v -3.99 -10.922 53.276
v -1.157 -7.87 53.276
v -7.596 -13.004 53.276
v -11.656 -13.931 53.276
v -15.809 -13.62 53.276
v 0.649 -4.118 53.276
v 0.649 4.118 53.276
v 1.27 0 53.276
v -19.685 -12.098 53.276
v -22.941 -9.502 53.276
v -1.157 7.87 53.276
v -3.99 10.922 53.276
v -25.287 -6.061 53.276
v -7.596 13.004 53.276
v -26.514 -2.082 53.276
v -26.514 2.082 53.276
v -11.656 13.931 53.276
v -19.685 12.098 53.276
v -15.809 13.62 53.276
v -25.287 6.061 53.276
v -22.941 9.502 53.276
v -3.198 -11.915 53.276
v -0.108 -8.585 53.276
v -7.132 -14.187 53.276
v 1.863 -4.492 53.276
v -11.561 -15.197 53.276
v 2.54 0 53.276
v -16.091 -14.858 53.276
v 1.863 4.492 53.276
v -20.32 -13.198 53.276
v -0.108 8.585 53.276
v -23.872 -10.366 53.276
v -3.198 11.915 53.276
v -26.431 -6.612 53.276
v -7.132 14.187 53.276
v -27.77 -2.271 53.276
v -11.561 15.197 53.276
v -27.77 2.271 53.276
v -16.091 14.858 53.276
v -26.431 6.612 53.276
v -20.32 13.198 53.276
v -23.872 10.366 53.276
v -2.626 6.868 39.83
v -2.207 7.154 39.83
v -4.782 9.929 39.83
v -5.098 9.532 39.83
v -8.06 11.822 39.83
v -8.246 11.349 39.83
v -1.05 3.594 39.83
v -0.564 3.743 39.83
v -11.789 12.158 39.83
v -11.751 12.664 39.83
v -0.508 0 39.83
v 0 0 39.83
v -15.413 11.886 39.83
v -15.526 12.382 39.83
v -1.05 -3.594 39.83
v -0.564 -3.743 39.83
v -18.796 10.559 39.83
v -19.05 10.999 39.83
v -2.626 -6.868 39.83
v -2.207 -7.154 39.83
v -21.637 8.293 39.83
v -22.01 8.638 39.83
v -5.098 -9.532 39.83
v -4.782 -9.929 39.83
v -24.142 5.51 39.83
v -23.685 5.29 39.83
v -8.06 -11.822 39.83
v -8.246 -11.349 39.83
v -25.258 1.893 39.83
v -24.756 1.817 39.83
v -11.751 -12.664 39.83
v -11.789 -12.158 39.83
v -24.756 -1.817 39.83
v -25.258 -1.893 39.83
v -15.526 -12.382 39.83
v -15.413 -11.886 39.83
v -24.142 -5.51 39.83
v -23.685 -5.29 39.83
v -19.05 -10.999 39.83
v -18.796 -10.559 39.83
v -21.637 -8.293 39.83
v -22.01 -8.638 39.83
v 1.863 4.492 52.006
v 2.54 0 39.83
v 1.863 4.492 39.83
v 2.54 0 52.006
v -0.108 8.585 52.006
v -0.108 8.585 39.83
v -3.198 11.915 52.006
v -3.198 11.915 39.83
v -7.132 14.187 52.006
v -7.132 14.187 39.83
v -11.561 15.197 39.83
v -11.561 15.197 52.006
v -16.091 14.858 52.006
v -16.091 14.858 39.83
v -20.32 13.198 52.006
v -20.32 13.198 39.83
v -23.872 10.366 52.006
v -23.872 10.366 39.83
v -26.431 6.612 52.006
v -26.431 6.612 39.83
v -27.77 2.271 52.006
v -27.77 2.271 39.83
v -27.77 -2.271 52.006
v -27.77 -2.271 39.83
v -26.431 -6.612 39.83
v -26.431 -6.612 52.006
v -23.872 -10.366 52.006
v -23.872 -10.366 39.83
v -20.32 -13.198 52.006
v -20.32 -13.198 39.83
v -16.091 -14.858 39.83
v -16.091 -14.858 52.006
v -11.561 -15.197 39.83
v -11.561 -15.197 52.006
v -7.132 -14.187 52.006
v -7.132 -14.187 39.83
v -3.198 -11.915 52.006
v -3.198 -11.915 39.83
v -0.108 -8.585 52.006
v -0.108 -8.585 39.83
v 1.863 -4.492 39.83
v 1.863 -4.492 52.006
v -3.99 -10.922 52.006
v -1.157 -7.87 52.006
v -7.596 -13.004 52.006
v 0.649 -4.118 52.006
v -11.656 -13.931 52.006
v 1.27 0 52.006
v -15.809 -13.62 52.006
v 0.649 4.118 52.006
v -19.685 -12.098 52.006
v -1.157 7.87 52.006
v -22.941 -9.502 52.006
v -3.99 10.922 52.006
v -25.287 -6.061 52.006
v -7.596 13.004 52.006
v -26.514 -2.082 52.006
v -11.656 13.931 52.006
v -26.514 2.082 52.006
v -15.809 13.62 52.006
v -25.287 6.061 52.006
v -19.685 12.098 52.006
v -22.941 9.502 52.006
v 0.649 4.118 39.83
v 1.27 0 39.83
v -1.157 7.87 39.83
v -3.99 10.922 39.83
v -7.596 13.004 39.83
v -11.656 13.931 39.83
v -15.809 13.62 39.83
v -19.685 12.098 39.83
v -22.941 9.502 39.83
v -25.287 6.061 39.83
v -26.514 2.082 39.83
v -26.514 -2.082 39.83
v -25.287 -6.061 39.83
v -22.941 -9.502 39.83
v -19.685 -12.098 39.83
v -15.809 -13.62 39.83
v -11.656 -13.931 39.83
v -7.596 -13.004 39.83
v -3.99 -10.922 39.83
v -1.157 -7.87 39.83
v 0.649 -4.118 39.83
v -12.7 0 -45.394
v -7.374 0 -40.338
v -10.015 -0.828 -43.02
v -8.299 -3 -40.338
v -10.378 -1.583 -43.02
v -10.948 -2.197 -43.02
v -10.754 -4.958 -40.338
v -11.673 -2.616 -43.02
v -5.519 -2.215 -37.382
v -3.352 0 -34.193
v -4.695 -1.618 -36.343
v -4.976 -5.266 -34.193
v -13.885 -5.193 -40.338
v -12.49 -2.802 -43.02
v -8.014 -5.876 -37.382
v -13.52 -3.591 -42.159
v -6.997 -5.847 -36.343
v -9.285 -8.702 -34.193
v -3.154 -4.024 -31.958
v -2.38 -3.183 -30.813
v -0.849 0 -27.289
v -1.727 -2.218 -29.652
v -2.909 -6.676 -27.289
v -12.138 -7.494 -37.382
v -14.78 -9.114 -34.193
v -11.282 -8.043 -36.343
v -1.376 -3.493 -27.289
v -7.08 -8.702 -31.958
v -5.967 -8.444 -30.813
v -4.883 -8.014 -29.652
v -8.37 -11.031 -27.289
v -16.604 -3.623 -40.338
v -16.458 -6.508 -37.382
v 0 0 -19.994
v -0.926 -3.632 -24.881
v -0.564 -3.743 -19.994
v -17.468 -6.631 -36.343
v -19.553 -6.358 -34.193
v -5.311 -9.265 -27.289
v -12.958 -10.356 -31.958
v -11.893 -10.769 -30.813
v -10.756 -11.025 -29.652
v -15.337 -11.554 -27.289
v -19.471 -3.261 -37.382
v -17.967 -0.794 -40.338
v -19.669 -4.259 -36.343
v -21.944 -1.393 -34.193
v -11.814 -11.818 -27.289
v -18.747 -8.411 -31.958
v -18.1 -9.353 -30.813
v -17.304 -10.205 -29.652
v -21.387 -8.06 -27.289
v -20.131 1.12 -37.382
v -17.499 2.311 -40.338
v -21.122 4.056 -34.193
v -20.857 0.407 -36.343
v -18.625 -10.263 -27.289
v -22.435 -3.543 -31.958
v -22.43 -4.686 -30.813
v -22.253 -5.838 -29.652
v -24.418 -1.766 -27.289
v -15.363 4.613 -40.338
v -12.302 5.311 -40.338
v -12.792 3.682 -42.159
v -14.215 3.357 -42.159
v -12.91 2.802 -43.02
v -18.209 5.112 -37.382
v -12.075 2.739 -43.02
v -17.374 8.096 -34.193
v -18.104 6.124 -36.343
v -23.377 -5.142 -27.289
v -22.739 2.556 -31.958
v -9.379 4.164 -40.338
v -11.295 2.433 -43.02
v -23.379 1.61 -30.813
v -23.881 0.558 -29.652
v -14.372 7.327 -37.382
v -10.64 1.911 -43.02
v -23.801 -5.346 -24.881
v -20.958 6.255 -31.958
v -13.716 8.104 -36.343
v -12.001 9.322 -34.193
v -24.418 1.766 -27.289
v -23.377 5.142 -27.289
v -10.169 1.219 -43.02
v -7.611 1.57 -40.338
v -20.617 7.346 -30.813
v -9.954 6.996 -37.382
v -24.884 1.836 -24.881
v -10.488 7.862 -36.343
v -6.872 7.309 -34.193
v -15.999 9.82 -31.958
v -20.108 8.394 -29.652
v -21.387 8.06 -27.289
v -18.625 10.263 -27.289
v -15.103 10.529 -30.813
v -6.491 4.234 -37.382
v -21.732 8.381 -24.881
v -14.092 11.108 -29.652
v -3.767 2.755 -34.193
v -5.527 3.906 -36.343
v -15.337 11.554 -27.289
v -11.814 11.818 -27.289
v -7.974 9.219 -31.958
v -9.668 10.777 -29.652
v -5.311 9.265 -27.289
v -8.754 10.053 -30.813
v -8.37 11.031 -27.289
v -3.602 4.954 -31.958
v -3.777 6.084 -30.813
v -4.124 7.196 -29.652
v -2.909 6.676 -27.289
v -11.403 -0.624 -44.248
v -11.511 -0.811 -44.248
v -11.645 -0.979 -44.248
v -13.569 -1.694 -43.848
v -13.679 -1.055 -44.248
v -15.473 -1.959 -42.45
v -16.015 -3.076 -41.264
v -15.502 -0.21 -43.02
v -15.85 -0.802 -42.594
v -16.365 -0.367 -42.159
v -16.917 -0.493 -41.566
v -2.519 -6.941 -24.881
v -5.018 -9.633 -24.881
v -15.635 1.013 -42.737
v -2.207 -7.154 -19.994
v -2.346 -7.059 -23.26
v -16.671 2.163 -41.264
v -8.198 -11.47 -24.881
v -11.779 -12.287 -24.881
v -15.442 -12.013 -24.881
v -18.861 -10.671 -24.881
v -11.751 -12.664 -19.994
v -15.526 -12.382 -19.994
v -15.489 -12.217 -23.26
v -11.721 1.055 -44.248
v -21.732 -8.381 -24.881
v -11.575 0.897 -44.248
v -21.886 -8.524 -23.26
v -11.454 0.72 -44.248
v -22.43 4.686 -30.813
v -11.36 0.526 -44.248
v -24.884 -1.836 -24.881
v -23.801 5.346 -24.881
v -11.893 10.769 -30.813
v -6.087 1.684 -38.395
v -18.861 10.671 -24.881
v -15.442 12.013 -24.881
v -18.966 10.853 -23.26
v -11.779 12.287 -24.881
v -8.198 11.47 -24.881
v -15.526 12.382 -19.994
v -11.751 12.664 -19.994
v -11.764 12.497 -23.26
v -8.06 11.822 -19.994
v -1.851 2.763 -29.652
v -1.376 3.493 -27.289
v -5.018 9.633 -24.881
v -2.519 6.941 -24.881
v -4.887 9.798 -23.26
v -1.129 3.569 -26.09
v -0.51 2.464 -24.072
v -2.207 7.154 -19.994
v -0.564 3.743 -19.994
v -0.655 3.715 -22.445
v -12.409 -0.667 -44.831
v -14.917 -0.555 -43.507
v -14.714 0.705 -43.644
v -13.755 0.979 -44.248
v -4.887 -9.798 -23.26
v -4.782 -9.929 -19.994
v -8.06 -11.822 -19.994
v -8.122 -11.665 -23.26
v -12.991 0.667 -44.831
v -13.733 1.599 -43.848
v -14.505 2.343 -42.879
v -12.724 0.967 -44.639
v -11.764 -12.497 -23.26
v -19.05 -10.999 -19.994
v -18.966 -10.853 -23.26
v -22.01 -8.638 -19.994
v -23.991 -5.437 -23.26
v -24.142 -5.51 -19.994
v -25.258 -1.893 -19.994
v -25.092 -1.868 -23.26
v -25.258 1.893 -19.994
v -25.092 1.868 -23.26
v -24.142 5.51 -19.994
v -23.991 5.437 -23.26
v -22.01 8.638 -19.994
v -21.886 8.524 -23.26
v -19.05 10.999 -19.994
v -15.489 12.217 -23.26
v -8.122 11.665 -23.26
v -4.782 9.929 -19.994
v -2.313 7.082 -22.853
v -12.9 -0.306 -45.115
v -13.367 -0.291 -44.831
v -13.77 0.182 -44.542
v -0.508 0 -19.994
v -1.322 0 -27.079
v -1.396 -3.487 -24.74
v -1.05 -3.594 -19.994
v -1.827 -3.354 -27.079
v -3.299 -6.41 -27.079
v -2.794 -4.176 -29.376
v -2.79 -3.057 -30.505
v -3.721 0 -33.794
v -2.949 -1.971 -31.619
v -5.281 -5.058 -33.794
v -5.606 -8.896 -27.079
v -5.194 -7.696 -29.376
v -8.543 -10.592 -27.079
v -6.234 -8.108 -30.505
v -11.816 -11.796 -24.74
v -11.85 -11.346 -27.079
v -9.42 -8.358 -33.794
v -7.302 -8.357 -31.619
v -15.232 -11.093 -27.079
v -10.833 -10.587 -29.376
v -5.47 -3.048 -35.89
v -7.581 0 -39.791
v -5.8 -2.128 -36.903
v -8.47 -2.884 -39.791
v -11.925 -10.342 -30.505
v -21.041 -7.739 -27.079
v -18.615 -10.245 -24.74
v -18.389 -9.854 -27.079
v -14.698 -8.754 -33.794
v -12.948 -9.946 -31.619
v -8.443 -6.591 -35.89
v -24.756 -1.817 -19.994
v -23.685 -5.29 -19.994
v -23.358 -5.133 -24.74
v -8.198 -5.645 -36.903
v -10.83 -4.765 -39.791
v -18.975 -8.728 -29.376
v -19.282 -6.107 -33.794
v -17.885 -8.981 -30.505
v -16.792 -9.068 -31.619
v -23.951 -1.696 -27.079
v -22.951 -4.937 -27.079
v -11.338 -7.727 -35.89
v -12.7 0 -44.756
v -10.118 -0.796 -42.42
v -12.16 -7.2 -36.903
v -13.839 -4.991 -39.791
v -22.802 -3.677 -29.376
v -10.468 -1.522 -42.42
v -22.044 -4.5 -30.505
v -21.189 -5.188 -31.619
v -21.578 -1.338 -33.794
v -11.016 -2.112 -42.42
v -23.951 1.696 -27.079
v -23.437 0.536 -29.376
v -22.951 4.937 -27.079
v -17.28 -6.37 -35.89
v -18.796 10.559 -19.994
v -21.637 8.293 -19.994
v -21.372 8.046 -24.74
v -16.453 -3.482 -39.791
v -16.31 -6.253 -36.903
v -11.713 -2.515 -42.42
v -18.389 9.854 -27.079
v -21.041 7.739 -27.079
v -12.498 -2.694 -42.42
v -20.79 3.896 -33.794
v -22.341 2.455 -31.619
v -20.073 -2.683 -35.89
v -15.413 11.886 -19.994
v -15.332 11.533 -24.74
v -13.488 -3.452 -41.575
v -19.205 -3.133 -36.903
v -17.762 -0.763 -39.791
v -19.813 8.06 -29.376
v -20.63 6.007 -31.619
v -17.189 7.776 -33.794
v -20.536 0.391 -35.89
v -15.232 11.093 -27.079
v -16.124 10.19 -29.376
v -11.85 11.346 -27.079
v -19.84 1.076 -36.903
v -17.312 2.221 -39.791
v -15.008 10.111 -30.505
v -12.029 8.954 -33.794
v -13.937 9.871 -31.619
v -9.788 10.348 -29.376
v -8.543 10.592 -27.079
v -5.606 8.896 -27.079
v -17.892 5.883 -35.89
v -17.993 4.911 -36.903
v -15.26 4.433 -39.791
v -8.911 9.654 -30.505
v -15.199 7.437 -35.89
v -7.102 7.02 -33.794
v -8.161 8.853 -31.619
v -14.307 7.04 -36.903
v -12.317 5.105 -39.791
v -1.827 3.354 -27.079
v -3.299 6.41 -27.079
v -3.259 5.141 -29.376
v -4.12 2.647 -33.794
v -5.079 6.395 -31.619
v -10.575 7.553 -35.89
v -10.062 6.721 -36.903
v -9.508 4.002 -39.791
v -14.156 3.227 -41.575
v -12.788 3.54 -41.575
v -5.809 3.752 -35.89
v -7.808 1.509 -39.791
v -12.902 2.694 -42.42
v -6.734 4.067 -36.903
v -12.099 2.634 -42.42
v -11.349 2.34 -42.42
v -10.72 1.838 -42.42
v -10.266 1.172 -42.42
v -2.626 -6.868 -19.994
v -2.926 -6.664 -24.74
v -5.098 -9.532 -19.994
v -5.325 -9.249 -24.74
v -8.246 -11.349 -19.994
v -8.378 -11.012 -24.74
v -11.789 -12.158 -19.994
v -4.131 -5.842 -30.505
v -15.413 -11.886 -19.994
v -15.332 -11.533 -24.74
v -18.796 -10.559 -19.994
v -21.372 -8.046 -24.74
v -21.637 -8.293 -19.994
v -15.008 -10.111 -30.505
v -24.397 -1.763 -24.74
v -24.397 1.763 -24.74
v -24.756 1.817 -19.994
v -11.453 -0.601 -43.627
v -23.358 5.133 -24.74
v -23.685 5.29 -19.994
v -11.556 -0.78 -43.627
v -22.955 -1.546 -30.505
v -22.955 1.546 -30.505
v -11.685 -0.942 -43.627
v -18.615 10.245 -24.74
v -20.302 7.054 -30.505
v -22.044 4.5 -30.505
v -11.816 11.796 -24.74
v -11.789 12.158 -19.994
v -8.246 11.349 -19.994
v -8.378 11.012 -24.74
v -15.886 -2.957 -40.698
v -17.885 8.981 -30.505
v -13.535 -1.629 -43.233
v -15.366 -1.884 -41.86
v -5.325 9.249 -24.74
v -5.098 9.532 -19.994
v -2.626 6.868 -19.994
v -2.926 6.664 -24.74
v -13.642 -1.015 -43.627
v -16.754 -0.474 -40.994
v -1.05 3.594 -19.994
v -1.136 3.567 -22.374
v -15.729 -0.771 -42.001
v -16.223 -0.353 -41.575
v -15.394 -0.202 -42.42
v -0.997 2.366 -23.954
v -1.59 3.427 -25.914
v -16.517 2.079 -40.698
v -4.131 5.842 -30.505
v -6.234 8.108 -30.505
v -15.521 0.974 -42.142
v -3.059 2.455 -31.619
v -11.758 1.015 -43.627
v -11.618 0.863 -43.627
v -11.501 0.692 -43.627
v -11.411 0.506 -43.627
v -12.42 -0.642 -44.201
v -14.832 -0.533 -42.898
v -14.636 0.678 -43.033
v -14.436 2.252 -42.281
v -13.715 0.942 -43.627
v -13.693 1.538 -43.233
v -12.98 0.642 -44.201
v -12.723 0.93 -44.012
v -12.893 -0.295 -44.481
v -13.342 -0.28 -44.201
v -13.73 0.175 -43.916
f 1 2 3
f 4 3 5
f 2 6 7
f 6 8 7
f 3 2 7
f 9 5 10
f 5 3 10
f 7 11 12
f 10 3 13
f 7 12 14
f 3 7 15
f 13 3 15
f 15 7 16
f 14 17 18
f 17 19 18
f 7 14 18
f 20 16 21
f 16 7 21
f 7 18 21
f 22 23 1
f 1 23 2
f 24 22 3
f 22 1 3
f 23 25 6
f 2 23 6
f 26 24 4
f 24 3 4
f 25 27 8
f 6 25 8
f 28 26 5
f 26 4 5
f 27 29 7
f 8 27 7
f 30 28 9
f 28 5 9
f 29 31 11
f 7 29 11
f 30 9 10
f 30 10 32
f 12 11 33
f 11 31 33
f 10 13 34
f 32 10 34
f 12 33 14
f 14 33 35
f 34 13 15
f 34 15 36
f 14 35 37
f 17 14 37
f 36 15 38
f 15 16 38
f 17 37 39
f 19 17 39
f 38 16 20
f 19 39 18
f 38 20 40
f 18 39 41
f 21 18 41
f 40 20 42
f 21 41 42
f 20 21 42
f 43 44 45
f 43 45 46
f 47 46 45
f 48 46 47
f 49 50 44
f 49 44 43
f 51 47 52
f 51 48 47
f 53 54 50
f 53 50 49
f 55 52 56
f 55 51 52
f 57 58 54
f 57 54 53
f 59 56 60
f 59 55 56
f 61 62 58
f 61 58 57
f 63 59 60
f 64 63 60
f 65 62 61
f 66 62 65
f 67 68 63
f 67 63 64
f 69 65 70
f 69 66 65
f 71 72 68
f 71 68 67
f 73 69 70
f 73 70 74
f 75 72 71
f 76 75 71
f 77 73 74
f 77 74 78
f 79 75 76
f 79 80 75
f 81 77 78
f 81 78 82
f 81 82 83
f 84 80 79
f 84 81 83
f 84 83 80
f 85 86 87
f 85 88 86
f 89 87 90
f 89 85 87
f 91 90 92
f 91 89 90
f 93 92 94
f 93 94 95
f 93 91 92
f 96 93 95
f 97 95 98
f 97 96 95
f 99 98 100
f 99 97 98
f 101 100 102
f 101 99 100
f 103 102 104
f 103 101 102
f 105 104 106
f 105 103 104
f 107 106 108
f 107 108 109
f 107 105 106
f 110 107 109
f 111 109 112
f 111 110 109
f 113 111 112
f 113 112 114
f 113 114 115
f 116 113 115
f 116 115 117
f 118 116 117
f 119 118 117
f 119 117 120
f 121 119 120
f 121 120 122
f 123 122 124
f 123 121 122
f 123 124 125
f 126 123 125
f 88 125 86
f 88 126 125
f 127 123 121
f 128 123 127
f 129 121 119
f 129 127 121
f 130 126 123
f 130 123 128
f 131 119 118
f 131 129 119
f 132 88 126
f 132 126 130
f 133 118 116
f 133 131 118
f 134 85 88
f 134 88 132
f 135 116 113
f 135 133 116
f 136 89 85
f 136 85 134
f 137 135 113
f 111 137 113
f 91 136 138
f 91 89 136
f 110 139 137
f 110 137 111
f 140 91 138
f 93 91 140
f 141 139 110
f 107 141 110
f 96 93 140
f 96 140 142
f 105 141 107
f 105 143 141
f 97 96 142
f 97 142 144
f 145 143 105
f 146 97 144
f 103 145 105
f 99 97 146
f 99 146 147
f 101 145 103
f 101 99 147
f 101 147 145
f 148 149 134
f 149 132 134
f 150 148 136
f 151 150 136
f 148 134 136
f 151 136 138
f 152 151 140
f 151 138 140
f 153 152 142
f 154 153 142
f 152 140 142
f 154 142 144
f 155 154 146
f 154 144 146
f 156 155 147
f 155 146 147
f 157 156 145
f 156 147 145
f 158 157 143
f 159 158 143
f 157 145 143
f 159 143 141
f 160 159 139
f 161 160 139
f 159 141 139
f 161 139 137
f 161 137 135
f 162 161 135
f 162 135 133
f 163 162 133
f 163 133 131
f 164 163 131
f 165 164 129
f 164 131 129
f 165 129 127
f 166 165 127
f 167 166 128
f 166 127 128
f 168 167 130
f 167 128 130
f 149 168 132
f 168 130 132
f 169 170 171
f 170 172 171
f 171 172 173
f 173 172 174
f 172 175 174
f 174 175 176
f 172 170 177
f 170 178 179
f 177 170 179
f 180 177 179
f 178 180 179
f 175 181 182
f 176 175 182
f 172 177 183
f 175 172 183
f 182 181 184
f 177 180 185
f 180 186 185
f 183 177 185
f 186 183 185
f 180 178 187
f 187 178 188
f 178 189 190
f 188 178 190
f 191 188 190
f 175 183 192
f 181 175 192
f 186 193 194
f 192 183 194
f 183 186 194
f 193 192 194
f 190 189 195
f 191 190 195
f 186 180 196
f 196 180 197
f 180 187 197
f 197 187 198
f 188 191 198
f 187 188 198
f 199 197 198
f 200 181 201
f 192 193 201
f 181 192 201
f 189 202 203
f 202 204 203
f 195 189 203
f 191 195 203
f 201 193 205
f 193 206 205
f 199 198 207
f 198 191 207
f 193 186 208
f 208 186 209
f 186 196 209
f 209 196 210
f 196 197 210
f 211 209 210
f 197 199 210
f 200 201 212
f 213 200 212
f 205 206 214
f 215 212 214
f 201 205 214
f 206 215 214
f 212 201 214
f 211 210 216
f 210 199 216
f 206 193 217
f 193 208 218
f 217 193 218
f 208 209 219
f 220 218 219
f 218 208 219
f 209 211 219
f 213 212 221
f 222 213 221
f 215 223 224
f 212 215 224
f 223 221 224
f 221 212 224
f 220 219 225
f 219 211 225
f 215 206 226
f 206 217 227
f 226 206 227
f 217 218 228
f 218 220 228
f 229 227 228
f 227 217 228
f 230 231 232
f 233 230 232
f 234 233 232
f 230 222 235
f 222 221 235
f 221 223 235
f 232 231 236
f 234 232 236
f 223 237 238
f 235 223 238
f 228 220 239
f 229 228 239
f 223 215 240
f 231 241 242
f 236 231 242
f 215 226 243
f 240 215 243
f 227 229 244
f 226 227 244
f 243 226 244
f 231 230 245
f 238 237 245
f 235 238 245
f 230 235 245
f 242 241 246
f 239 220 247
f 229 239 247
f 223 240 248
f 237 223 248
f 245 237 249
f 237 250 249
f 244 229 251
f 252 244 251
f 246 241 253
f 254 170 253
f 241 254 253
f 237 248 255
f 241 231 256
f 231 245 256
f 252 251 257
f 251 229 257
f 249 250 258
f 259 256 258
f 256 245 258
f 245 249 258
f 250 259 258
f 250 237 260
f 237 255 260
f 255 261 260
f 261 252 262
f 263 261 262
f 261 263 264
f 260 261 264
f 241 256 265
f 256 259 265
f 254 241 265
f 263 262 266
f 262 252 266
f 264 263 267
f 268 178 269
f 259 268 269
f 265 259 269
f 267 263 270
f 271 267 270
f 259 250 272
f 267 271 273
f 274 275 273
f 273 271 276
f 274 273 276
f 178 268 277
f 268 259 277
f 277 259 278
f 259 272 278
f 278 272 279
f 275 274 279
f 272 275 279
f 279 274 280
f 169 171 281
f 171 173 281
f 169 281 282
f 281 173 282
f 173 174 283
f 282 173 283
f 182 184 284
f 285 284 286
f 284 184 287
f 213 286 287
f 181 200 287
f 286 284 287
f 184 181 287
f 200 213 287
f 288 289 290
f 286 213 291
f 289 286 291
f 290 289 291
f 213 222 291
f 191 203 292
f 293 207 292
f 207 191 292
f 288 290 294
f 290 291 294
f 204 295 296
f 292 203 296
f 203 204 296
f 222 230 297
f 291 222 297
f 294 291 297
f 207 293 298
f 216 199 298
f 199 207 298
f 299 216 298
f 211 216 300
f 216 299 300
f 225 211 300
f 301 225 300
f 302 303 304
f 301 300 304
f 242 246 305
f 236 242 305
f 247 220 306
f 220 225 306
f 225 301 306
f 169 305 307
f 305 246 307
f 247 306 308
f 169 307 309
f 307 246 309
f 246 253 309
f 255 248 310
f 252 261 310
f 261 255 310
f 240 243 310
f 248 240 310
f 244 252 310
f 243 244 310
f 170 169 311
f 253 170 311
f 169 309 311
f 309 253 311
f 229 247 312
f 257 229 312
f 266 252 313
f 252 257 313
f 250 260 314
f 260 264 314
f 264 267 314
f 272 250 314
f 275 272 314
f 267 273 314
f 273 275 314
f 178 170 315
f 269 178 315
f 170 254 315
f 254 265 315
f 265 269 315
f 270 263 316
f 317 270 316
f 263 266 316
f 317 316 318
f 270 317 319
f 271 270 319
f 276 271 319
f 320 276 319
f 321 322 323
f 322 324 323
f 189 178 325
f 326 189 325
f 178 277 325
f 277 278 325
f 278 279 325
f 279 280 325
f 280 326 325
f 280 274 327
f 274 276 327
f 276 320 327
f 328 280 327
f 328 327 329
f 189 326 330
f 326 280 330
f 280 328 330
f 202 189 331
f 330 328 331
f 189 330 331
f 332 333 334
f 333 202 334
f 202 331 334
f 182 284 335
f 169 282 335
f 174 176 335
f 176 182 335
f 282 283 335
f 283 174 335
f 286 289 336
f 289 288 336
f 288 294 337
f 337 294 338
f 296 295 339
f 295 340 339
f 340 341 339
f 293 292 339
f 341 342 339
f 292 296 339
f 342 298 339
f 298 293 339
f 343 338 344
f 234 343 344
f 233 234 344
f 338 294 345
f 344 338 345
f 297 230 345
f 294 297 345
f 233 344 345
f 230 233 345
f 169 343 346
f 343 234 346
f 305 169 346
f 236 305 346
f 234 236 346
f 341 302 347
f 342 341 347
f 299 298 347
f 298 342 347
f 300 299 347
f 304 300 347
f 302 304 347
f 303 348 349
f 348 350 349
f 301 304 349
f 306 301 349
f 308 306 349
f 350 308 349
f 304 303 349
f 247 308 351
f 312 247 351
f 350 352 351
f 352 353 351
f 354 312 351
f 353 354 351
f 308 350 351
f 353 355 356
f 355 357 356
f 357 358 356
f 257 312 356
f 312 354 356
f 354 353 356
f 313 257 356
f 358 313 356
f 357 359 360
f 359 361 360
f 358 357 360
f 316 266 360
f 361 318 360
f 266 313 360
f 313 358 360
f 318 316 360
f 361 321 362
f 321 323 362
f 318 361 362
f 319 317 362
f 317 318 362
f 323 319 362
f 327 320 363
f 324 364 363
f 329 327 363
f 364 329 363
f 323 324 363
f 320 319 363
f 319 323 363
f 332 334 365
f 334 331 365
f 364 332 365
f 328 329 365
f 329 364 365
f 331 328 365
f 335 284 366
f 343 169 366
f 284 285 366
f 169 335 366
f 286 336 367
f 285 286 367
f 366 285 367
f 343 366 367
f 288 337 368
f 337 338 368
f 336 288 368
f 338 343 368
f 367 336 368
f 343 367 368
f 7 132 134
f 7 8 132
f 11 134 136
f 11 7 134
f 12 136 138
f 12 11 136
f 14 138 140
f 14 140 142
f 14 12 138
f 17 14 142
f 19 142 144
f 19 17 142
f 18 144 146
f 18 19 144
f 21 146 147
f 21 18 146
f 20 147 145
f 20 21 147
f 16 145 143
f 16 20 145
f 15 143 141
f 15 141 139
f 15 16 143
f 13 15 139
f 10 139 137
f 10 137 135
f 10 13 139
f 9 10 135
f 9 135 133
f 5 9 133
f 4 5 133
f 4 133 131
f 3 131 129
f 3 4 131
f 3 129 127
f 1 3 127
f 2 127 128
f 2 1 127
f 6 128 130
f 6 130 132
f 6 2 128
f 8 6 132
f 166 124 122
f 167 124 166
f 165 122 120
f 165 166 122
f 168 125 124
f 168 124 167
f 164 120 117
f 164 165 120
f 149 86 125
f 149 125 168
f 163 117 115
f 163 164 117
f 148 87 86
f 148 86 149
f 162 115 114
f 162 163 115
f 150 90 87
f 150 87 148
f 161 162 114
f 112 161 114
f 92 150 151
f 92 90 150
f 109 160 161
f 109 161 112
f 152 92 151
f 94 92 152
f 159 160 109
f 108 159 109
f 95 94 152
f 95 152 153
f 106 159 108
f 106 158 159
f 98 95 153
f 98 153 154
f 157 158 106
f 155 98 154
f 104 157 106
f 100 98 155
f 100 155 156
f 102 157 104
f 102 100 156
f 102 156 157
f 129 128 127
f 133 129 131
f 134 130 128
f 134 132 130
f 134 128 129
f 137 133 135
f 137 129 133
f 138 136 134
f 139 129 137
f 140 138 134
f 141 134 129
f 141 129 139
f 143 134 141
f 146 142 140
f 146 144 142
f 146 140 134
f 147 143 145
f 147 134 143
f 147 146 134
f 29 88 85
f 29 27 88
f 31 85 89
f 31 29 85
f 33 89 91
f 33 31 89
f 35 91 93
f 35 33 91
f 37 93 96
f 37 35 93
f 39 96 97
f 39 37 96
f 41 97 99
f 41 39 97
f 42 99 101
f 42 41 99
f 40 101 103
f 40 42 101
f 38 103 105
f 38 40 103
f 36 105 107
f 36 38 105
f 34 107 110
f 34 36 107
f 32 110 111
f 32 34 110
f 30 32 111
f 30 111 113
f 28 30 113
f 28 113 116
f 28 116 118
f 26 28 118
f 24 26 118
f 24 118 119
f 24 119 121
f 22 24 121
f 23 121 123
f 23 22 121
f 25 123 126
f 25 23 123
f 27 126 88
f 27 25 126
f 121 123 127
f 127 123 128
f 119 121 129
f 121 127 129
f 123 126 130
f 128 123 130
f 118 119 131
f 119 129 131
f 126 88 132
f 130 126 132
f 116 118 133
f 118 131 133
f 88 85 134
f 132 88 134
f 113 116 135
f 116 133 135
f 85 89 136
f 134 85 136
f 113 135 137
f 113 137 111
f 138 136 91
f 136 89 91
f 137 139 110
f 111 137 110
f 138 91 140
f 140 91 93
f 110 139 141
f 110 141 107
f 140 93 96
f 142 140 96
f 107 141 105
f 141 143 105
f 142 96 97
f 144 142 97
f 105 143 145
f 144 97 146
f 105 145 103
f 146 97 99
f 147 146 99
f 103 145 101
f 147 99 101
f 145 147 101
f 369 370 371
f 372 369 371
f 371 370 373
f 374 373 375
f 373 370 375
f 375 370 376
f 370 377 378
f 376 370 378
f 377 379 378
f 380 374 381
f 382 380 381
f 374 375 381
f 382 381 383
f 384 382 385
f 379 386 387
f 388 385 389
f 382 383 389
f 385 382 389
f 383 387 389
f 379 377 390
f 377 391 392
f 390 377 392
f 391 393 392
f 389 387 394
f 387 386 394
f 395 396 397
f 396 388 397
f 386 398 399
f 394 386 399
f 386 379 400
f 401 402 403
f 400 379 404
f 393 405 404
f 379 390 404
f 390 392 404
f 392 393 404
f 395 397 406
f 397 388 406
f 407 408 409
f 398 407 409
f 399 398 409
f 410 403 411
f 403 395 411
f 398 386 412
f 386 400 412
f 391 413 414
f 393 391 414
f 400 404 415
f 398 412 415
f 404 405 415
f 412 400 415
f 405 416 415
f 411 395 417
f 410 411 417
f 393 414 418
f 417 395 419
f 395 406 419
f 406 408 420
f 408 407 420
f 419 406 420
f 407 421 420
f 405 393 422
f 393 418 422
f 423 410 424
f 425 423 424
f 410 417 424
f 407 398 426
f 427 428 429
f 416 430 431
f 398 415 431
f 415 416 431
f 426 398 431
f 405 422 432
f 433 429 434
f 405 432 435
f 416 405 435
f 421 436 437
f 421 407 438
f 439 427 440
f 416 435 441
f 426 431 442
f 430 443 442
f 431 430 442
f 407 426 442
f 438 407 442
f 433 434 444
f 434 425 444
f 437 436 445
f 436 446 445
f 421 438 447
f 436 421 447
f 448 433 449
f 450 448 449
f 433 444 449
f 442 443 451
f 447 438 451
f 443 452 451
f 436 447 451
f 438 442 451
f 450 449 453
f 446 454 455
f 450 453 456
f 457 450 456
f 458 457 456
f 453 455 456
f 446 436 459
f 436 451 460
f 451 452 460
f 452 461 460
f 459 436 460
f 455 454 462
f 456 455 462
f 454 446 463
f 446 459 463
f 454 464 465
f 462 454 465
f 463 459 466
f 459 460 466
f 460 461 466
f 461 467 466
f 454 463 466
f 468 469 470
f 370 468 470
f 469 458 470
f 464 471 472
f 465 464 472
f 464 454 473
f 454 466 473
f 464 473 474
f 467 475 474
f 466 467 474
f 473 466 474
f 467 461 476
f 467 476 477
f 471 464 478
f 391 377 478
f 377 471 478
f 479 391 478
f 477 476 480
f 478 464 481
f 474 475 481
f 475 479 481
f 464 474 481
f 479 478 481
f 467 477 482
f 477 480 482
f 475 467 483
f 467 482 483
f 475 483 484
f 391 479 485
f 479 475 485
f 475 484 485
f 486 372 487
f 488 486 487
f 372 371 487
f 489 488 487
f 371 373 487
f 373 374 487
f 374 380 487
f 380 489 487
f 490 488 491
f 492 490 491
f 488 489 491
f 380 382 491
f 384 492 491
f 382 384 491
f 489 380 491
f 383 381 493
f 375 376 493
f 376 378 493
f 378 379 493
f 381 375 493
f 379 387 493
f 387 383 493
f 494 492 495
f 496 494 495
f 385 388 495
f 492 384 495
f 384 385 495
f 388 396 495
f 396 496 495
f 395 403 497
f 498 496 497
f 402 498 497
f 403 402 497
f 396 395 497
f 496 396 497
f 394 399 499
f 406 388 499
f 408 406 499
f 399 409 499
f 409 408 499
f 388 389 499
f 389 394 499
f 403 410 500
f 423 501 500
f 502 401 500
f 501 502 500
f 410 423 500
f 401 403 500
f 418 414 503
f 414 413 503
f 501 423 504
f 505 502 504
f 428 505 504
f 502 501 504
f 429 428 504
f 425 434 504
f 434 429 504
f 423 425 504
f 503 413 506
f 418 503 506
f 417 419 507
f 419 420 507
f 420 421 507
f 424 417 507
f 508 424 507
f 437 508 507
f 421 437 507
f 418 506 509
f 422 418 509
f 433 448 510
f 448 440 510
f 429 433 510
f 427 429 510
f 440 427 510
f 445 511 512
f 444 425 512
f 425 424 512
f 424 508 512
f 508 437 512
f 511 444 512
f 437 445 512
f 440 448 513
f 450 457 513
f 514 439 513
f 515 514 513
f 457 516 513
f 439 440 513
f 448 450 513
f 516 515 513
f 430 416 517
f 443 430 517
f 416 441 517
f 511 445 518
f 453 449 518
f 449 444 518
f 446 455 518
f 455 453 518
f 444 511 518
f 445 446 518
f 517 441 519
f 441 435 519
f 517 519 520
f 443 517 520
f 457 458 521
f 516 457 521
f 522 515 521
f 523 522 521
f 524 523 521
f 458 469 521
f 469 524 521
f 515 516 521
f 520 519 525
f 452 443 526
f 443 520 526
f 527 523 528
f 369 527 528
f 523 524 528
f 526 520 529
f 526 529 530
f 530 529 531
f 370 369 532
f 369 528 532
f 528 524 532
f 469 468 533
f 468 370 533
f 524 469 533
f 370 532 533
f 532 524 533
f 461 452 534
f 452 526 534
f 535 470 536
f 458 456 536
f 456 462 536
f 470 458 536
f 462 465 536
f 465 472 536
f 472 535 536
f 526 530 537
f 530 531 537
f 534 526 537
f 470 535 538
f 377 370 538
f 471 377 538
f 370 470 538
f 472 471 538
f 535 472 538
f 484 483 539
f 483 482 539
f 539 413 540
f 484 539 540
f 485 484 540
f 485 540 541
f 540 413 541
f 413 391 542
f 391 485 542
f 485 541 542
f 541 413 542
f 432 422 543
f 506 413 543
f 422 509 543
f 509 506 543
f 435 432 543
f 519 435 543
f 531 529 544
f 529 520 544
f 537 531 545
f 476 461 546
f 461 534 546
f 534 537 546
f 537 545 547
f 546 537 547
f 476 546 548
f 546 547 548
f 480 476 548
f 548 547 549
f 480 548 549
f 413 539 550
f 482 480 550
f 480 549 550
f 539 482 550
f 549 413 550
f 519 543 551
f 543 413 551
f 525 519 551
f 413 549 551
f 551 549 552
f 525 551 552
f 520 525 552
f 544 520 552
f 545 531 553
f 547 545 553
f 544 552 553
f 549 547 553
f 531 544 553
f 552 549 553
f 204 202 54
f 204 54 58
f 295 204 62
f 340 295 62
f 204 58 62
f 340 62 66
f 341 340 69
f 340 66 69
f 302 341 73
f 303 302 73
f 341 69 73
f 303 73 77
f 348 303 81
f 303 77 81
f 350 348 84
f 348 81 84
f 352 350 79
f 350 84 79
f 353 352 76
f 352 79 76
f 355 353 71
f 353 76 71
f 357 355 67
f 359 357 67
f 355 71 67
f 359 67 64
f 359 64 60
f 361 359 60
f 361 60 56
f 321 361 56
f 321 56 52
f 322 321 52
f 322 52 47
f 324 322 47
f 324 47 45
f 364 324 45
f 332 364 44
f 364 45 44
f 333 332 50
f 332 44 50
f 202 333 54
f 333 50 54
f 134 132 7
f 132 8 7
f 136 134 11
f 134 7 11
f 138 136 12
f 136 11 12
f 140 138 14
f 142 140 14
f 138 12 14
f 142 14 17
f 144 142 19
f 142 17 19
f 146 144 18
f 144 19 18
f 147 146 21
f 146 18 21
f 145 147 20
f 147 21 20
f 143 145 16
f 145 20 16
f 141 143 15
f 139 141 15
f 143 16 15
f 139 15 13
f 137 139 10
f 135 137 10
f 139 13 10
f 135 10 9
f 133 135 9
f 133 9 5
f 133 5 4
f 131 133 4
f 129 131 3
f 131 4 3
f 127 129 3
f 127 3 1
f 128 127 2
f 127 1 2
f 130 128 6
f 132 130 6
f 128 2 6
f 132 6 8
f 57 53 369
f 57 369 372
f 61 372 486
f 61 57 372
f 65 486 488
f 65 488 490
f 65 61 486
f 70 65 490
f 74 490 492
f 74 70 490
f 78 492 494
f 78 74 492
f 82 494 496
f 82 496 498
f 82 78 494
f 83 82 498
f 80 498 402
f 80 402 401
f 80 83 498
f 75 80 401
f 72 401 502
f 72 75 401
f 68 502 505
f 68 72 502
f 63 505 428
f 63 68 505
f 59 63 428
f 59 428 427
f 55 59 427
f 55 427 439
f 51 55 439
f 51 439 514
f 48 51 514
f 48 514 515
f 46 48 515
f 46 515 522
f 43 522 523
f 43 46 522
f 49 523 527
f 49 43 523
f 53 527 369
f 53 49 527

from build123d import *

# Parameters (mm, degrees)
F0_W   = 1.27
F0_H   = 12.1760693179
F0_W_2 = 0.508
F0_H_2 = 59.8236961528
F0_W_3 = 13.97
F0_H_3 = 1.27


with BuildPart() as f1:
    # F0 (on Front) → F1 (revolve)
    with BuildSketch(Plane.XZ):
        with Locations((1.905, 45.9177069778)):
            Rectangle(F0_W, F0_H)
    revolve(axis=Axis((-12.7, 0, 46.5527069778), (0, 0, 1)))


with BuildPart() as f2:
    # F0 (on Front) → F2 (revolve)
    with BuildSketch(Plane.XZ):
        with Locations((-0.254, 9.9178242424)):
            Rectangle(F0_W_2, F0_H_2)
    revolve(axis=Axis((-12.7, 0, 9.9178242424), (0, 0, -1)))

    # F0 (on Front) → F5 (revolve)
    with BuildSketch(Plane.XZ):
        with BuildLine():
            ThreePointArc((-12.7, -45.394023834), (-3.3519366858, -34.1930554912), (0, -19.994023834))
            Line((0, -19.994023834), (-0.508, -19.994023834))
            ThreePointArc((-0.508, -19.994023834), (-3.7212409836, -33.7944307846), (-12.7, -44.7560928914))
            Line((-12.7, -44.7560928914), (-12.7, -45.394023834))
        make_face()
    revolve(axis=Axis((-12.7, 0, -32.694023834), (0, 0, -1)))


with BuildPart() as f3:
    # F0 (on Front) → F3 (revolve)
    with BuildSketch(Plane.XZ):
        with Locations((-5.715, 52.6407416368)):
            Rectangle(F0_W_3, F0_H_3)
    revolve(axis=Axis((-12.7, 0, 46.5527069778), (0, 0, 1)))


with BuildPart() as f4:
    # F0 (on Front) → F4 (revolve)
    with BuildSketch(Plane.XZ):
        with Locations((1.905, 52.6407416368)):
            Rectangle(F0_W, F0_H_3)
    revolve(axis=Axis((-12.7, 0, 46.5527069778), (0, 0, 1)))


solid = Compound([f1.part, f2.part, f3.part, f4.part])
